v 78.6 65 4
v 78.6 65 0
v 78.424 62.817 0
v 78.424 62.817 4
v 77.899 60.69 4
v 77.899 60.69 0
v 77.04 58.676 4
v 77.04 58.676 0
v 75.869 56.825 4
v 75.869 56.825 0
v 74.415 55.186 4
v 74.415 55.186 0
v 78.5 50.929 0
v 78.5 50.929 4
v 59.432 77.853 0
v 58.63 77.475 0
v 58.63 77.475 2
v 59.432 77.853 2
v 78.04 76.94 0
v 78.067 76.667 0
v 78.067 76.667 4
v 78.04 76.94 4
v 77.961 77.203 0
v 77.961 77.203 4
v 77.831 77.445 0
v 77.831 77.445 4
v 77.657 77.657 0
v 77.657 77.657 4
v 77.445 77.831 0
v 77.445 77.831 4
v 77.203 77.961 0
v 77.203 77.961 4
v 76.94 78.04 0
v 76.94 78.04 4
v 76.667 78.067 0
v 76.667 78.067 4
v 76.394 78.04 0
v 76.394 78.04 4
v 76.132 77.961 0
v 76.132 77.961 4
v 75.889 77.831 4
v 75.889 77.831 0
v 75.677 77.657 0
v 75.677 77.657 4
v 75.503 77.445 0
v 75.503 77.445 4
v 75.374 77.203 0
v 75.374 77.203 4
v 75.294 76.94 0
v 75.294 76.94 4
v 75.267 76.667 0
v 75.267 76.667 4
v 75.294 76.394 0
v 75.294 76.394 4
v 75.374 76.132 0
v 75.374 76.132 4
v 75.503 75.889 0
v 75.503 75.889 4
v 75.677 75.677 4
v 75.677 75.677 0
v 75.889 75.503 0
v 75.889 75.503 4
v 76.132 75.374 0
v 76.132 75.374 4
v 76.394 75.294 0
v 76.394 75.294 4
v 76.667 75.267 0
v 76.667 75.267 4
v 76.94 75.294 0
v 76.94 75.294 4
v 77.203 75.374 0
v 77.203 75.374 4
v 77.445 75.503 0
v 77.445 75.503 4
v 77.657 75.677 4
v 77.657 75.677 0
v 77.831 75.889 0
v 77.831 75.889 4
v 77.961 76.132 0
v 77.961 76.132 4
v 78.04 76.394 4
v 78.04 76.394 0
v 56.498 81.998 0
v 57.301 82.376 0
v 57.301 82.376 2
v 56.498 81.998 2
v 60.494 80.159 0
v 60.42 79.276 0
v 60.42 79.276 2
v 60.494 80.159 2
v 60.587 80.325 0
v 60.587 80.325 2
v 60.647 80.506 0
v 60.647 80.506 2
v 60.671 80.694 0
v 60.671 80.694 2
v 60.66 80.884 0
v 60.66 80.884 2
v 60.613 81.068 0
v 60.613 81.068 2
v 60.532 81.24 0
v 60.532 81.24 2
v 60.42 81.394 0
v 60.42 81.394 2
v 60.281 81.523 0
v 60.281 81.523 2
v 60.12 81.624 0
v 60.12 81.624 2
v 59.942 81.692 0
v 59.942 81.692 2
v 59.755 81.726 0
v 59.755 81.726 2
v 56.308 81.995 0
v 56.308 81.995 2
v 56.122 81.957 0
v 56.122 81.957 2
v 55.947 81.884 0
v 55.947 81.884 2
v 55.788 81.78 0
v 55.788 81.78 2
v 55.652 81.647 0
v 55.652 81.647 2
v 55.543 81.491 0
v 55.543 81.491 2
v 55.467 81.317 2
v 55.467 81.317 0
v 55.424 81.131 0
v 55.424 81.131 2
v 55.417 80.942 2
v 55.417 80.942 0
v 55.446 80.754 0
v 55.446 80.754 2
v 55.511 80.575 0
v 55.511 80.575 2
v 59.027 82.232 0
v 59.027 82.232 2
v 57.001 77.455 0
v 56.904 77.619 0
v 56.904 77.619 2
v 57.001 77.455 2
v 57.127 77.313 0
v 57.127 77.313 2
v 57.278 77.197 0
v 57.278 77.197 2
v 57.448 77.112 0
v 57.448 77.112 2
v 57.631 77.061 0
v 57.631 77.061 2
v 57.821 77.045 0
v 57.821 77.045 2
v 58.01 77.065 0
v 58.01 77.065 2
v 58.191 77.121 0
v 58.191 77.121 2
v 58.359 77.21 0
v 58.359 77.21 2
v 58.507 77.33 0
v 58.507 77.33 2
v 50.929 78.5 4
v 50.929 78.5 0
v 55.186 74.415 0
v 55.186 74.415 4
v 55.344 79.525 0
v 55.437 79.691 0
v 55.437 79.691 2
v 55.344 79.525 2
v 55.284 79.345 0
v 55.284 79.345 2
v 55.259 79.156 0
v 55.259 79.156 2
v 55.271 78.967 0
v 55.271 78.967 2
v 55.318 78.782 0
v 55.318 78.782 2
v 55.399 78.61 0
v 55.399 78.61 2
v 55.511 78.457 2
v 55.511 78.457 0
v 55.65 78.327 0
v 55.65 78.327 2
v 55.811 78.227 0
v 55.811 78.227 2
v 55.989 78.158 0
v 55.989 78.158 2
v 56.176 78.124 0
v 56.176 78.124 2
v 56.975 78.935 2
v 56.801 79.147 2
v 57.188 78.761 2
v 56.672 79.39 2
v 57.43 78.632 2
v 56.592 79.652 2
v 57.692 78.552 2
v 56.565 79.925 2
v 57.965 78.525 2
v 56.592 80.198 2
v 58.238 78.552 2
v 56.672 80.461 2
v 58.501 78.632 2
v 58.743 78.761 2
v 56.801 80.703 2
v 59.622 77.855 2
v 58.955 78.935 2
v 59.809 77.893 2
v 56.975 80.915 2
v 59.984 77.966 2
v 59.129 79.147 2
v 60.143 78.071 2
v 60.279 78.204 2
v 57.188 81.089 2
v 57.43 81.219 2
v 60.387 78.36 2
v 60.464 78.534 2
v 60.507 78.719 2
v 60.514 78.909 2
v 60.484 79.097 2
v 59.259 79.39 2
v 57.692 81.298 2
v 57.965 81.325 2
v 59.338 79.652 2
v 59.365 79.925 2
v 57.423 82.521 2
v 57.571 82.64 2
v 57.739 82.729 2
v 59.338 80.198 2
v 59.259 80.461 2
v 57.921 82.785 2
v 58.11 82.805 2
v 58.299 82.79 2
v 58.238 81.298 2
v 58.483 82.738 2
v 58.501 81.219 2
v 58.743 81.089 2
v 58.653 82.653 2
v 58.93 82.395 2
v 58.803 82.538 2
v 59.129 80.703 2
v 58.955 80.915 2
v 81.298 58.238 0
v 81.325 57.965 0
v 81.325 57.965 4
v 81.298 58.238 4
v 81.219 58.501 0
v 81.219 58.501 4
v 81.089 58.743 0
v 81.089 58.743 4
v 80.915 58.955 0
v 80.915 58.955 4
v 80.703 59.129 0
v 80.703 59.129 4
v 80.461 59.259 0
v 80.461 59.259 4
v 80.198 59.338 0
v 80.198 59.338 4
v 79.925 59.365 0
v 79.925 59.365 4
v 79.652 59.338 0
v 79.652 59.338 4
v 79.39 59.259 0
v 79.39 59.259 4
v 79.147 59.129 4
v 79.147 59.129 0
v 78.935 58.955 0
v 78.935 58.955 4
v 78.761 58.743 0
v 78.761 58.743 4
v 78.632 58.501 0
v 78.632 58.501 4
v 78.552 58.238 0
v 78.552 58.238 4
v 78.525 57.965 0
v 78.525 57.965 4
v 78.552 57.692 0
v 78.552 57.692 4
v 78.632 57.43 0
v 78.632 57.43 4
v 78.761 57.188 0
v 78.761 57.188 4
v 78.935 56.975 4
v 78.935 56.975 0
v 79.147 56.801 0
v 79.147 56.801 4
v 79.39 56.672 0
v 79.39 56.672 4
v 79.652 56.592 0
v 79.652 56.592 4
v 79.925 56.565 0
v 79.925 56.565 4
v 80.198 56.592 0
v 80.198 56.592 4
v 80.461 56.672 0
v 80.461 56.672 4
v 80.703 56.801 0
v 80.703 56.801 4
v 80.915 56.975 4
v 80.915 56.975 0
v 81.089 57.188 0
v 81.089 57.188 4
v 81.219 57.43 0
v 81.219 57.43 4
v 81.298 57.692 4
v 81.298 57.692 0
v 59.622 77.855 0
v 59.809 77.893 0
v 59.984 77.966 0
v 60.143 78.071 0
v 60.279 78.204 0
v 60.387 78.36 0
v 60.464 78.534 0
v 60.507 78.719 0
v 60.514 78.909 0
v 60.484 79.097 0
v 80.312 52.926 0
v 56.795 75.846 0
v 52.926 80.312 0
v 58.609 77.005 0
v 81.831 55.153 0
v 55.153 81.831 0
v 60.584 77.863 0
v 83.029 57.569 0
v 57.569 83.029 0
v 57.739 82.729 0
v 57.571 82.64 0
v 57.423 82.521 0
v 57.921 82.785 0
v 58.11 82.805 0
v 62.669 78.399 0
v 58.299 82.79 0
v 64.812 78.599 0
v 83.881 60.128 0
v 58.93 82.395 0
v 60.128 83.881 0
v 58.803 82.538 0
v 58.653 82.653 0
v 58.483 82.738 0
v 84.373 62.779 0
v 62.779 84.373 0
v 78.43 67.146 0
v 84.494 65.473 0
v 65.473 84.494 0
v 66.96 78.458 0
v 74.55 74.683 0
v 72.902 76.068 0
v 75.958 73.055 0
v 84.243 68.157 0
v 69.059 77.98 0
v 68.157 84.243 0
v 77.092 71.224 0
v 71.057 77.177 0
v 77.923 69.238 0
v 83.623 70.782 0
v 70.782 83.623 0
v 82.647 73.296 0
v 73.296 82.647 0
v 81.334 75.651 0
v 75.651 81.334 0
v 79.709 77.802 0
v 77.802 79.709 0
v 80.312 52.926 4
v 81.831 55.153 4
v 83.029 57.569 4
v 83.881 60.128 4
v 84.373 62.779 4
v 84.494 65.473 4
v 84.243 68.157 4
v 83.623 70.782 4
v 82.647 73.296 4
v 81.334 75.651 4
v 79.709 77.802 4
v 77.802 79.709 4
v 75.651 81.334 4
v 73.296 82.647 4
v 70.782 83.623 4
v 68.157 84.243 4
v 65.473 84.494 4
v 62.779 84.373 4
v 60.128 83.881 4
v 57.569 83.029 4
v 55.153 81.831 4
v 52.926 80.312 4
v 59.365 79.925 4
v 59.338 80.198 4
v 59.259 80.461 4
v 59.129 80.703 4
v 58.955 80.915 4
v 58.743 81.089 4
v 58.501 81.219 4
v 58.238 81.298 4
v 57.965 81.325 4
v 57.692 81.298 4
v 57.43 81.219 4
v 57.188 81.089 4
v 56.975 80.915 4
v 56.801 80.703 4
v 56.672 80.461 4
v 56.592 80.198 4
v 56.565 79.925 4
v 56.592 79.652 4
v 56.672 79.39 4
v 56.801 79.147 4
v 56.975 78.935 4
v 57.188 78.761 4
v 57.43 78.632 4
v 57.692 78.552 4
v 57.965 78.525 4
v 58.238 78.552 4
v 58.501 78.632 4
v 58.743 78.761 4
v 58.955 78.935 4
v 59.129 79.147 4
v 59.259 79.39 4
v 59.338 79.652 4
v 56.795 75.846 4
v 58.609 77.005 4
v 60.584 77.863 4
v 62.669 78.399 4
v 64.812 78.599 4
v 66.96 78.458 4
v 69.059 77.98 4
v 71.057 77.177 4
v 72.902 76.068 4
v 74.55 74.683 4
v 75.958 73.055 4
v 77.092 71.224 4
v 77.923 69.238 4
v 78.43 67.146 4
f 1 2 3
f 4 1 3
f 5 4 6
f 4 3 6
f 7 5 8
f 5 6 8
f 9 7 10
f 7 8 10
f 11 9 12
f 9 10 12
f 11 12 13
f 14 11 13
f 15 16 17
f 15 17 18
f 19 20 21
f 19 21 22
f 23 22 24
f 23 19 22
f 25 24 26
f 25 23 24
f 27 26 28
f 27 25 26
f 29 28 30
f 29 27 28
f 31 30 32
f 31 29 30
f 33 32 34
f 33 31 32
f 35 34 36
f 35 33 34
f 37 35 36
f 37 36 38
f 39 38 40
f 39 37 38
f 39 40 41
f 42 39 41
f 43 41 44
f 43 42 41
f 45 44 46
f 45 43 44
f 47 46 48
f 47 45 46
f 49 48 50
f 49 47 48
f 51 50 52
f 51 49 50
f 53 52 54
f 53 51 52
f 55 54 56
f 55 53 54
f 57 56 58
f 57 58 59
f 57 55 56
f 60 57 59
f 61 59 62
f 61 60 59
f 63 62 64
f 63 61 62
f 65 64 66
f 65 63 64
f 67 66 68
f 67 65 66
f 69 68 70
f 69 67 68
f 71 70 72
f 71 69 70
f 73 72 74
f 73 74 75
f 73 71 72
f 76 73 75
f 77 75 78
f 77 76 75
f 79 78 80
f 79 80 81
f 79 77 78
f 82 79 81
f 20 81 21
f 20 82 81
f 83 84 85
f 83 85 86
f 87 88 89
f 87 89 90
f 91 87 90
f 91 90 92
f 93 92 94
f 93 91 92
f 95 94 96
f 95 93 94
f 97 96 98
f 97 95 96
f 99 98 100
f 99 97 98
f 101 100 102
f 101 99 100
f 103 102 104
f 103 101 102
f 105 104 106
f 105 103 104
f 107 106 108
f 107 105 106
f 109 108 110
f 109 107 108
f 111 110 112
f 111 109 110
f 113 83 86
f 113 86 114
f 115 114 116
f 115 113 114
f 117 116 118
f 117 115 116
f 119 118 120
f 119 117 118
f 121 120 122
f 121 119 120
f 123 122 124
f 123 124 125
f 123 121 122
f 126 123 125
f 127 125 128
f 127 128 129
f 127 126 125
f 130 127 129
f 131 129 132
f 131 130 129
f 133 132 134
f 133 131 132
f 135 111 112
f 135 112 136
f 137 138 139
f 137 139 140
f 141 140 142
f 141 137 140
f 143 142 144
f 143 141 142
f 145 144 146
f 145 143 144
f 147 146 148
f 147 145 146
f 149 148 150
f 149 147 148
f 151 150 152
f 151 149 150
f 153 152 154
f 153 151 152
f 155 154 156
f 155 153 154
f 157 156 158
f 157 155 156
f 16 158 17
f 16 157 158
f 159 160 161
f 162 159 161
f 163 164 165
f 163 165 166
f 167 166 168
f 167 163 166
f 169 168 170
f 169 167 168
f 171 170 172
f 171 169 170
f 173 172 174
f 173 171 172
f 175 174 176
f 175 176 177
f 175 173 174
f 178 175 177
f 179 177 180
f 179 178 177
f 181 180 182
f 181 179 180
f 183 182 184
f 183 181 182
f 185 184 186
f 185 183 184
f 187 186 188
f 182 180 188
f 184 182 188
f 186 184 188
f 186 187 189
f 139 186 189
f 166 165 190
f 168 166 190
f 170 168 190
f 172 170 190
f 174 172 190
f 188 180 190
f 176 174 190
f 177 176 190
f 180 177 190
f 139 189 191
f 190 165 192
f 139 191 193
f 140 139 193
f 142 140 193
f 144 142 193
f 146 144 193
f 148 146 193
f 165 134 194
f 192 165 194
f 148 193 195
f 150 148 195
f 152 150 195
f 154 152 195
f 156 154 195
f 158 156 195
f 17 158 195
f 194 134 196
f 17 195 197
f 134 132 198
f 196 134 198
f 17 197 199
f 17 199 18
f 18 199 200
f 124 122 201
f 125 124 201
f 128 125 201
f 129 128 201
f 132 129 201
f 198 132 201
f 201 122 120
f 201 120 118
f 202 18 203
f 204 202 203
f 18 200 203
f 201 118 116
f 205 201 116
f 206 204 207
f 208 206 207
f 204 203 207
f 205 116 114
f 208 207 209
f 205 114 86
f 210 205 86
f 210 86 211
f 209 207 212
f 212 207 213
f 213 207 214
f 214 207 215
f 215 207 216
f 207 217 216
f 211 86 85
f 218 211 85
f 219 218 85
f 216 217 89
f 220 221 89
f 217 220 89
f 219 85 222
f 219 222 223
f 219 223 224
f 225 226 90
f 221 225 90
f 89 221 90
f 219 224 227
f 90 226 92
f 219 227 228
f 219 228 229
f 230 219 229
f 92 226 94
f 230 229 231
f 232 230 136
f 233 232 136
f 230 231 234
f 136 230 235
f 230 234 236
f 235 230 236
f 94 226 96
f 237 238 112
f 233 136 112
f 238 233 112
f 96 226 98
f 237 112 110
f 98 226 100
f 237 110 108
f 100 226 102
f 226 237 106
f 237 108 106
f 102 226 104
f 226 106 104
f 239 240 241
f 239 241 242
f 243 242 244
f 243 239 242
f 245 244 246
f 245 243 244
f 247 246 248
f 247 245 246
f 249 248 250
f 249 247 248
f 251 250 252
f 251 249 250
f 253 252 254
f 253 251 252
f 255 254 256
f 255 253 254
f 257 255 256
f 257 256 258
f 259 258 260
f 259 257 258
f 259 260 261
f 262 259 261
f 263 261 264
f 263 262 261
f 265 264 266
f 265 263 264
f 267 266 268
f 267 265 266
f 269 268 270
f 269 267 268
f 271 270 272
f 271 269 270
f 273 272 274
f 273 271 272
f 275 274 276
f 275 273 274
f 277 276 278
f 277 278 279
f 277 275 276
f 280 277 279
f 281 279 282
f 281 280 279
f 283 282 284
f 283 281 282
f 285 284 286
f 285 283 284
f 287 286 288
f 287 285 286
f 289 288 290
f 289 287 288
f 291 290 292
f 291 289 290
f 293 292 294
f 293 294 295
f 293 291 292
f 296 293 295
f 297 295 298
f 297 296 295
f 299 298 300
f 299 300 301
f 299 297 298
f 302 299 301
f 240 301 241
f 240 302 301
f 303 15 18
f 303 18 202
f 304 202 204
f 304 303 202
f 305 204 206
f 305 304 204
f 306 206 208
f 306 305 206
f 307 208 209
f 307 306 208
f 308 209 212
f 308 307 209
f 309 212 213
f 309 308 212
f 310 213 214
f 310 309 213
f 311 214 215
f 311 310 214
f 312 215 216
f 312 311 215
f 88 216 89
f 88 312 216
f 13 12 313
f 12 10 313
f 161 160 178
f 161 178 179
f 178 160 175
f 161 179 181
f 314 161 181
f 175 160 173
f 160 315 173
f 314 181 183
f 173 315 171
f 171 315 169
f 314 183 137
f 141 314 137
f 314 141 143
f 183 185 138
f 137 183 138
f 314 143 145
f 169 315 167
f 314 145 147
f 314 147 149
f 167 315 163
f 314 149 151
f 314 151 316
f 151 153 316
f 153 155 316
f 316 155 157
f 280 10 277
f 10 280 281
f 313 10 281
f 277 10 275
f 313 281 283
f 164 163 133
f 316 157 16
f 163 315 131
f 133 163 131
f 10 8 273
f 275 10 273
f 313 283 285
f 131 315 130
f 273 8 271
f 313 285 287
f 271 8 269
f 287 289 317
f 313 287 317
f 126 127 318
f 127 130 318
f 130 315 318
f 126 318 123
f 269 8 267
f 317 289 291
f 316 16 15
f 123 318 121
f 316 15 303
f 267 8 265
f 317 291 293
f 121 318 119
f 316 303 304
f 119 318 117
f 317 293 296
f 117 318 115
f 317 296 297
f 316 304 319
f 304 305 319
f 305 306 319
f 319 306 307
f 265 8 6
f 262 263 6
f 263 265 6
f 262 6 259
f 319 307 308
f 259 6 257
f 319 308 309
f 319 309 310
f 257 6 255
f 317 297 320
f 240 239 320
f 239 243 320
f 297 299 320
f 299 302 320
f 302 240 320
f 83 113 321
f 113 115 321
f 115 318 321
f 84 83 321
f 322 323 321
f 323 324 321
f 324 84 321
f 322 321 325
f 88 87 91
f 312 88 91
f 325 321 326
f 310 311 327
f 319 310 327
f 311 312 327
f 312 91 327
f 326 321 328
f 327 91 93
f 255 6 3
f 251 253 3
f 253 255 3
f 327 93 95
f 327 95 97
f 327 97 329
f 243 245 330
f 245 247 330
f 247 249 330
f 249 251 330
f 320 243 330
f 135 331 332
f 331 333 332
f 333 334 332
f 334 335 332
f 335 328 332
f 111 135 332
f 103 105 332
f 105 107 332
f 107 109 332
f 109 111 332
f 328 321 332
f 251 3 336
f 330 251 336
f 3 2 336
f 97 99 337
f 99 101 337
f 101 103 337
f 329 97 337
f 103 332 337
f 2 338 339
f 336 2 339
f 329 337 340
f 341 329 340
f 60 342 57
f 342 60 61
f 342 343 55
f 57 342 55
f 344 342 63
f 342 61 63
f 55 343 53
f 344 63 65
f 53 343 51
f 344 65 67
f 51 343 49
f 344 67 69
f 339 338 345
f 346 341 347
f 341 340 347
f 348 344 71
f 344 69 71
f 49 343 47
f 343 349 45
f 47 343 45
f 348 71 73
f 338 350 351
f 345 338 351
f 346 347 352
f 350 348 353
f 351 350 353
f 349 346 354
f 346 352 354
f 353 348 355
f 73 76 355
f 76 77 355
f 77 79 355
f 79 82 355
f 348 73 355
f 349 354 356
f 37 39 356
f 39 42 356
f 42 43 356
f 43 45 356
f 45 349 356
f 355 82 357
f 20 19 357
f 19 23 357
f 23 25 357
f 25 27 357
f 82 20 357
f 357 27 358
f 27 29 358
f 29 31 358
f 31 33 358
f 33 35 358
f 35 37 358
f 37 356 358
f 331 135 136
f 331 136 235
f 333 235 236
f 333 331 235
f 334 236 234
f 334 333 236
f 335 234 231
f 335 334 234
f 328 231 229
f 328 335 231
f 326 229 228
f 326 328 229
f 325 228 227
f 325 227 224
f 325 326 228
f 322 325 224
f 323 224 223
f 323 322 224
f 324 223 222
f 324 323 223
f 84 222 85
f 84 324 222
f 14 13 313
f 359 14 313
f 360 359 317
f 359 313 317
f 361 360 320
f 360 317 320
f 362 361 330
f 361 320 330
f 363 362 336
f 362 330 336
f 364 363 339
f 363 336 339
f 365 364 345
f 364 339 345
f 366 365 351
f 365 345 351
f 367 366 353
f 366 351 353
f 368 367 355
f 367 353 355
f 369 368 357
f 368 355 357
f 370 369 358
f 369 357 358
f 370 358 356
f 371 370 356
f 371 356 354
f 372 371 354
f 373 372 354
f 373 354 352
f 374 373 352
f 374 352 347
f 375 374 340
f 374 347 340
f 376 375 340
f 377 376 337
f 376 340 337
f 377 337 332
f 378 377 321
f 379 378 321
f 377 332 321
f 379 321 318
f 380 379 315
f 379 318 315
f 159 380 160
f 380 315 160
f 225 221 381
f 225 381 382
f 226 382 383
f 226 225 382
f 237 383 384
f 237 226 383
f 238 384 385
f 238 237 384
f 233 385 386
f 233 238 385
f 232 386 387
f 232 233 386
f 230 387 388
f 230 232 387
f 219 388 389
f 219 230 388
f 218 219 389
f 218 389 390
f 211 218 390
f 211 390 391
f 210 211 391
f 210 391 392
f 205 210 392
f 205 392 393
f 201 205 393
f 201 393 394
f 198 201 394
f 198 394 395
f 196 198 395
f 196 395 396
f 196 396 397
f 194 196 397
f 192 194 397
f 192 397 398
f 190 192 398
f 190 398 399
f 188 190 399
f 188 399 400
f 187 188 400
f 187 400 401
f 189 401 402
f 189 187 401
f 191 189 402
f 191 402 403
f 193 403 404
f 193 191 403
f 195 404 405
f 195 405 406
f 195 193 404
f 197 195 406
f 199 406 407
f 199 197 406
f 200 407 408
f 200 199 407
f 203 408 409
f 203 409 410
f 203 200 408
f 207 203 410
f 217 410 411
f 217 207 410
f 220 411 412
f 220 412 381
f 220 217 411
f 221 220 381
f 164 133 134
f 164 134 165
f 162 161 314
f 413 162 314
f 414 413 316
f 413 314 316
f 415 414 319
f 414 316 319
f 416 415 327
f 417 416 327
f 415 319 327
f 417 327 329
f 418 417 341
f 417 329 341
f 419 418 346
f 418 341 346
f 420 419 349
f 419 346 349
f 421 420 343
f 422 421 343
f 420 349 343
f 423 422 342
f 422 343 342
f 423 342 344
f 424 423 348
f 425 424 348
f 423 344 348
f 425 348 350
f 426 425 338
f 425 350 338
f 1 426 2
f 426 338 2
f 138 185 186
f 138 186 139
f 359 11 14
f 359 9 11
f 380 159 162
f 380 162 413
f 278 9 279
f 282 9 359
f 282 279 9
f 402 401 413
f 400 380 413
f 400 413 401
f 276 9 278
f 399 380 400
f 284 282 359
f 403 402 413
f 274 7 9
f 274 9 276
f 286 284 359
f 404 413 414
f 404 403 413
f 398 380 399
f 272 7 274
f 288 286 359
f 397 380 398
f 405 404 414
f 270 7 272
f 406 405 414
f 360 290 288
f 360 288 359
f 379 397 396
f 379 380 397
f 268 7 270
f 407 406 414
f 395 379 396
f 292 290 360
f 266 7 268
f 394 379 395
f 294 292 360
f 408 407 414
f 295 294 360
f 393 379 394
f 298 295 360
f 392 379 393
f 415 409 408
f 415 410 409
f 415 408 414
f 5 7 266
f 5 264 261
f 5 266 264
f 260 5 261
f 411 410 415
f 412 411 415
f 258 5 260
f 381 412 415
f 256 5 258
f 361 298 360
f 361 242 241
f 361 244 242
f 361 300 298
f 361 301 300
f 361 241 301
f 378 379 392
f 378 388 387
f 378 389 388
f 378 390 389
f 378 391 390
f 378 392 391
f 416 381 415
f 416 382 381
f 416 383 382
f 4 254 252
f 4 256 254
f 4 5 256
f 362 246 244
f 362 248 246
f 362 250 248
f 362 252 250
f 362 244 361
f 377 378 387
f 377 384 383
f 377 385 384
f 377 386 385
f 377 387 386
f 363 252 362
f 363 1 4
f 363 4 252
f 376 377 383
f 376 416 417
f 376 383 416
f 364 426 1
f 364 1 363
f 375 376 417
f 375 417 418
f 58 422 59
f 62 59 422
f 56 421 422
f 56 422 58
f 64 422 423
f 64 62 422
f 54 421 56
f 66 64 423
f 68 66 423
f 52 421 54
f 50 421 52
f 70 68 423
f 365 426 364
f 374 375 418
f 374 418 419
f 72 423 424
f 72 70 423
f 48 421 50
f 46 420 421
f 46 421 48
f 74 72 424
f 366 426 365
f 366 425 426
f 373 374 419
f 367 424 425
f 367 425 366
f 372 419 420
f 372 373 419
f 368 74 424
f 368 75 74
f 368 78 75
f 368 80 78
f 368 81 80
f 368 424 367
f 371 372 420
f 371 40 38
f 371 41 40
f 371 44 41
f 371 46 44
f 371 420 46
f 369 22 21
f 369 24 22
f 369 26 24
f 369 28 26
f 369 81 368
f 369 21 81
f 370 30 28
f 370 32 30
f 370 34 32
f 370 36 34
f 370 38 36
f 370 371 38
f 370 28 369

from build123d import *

# Parameters (mm, degrees)
SKETCH1_R      = 1.4
SHAPE_DEPTH    = 4
SKETCH2_R      = 1
NUT_CUTS_DEPTH = 2


with BuildPart() as part:
    # Sketch1 → Shape (new body)
    with BuildSketch(Plane.XY):
        with BuildLine():
            Line((74.415384615, 55.186207026), (78.5, 50.928752721))
            ThreePointArc((78.5, 50.928752721), (78.788582233, 78.788582233), (50.928752721, 78.5))
            Line((50.928752721, 78.5), (55.186207026, 74.415384615))
            ThreePointArc((55.186207026, 74.415384615), (70.07407211, 77.617994778), (78.6, 65))
            ThreePointArc((78.6, 65), (77.51018047, 59.665641124), (74.415384615, 55.186207026))
        make_face()
        with Locations((79.925281419, 57.965373175)):
            Circle(SKETCH1_R, mode=Mode.SUBTRACT)
        with Locations((57.965373175, 79.925281419)):
            Circle(SKETCH1_R, mode=Mode.SUBTRACT)
        with Locations((76.66726189, 76.66726189)):
            Circle(SKETCH1_R, mode=Mode.SUBTRACT)
    extrude(amount=SHAPE_DEPTH)

    # Sketch2 → Nut cuts (cut)
    with BuildSketch(Plane.XY):
        with Locations((56.258688641, 79.120881926)):
            Circle(SKETCH2_R)
        with Locations((56.415400513, 81.001113835)):
            Circle(SKETCH2_R)
        with Locations((58.122085046, 81.805513328)):
            Circle(SKETCH2_R)
        with Locations((59.672057709, 80.729680912)):
            Circle(SKETCH2_R)
        with Locations((59.515345837, 78.849449003)):
            Circle(SKETCH2_R)
        with Locations((57.808661304, 78.04504951)):
            Circle(SKETCH2_R)
        Polygon((60.576620219, 81.156021931), (58.205144148, 82.802057951), (55.593897104, 81.571317438), (55.354126131, 78.694540907), (57.725602202, 77.048504887), (60.336849246, 78.2792454), align=None)
    extrude(amount=NUT_CUTS_DEPTH, mode=Mode.SUBTRACT)


solid = part.part
